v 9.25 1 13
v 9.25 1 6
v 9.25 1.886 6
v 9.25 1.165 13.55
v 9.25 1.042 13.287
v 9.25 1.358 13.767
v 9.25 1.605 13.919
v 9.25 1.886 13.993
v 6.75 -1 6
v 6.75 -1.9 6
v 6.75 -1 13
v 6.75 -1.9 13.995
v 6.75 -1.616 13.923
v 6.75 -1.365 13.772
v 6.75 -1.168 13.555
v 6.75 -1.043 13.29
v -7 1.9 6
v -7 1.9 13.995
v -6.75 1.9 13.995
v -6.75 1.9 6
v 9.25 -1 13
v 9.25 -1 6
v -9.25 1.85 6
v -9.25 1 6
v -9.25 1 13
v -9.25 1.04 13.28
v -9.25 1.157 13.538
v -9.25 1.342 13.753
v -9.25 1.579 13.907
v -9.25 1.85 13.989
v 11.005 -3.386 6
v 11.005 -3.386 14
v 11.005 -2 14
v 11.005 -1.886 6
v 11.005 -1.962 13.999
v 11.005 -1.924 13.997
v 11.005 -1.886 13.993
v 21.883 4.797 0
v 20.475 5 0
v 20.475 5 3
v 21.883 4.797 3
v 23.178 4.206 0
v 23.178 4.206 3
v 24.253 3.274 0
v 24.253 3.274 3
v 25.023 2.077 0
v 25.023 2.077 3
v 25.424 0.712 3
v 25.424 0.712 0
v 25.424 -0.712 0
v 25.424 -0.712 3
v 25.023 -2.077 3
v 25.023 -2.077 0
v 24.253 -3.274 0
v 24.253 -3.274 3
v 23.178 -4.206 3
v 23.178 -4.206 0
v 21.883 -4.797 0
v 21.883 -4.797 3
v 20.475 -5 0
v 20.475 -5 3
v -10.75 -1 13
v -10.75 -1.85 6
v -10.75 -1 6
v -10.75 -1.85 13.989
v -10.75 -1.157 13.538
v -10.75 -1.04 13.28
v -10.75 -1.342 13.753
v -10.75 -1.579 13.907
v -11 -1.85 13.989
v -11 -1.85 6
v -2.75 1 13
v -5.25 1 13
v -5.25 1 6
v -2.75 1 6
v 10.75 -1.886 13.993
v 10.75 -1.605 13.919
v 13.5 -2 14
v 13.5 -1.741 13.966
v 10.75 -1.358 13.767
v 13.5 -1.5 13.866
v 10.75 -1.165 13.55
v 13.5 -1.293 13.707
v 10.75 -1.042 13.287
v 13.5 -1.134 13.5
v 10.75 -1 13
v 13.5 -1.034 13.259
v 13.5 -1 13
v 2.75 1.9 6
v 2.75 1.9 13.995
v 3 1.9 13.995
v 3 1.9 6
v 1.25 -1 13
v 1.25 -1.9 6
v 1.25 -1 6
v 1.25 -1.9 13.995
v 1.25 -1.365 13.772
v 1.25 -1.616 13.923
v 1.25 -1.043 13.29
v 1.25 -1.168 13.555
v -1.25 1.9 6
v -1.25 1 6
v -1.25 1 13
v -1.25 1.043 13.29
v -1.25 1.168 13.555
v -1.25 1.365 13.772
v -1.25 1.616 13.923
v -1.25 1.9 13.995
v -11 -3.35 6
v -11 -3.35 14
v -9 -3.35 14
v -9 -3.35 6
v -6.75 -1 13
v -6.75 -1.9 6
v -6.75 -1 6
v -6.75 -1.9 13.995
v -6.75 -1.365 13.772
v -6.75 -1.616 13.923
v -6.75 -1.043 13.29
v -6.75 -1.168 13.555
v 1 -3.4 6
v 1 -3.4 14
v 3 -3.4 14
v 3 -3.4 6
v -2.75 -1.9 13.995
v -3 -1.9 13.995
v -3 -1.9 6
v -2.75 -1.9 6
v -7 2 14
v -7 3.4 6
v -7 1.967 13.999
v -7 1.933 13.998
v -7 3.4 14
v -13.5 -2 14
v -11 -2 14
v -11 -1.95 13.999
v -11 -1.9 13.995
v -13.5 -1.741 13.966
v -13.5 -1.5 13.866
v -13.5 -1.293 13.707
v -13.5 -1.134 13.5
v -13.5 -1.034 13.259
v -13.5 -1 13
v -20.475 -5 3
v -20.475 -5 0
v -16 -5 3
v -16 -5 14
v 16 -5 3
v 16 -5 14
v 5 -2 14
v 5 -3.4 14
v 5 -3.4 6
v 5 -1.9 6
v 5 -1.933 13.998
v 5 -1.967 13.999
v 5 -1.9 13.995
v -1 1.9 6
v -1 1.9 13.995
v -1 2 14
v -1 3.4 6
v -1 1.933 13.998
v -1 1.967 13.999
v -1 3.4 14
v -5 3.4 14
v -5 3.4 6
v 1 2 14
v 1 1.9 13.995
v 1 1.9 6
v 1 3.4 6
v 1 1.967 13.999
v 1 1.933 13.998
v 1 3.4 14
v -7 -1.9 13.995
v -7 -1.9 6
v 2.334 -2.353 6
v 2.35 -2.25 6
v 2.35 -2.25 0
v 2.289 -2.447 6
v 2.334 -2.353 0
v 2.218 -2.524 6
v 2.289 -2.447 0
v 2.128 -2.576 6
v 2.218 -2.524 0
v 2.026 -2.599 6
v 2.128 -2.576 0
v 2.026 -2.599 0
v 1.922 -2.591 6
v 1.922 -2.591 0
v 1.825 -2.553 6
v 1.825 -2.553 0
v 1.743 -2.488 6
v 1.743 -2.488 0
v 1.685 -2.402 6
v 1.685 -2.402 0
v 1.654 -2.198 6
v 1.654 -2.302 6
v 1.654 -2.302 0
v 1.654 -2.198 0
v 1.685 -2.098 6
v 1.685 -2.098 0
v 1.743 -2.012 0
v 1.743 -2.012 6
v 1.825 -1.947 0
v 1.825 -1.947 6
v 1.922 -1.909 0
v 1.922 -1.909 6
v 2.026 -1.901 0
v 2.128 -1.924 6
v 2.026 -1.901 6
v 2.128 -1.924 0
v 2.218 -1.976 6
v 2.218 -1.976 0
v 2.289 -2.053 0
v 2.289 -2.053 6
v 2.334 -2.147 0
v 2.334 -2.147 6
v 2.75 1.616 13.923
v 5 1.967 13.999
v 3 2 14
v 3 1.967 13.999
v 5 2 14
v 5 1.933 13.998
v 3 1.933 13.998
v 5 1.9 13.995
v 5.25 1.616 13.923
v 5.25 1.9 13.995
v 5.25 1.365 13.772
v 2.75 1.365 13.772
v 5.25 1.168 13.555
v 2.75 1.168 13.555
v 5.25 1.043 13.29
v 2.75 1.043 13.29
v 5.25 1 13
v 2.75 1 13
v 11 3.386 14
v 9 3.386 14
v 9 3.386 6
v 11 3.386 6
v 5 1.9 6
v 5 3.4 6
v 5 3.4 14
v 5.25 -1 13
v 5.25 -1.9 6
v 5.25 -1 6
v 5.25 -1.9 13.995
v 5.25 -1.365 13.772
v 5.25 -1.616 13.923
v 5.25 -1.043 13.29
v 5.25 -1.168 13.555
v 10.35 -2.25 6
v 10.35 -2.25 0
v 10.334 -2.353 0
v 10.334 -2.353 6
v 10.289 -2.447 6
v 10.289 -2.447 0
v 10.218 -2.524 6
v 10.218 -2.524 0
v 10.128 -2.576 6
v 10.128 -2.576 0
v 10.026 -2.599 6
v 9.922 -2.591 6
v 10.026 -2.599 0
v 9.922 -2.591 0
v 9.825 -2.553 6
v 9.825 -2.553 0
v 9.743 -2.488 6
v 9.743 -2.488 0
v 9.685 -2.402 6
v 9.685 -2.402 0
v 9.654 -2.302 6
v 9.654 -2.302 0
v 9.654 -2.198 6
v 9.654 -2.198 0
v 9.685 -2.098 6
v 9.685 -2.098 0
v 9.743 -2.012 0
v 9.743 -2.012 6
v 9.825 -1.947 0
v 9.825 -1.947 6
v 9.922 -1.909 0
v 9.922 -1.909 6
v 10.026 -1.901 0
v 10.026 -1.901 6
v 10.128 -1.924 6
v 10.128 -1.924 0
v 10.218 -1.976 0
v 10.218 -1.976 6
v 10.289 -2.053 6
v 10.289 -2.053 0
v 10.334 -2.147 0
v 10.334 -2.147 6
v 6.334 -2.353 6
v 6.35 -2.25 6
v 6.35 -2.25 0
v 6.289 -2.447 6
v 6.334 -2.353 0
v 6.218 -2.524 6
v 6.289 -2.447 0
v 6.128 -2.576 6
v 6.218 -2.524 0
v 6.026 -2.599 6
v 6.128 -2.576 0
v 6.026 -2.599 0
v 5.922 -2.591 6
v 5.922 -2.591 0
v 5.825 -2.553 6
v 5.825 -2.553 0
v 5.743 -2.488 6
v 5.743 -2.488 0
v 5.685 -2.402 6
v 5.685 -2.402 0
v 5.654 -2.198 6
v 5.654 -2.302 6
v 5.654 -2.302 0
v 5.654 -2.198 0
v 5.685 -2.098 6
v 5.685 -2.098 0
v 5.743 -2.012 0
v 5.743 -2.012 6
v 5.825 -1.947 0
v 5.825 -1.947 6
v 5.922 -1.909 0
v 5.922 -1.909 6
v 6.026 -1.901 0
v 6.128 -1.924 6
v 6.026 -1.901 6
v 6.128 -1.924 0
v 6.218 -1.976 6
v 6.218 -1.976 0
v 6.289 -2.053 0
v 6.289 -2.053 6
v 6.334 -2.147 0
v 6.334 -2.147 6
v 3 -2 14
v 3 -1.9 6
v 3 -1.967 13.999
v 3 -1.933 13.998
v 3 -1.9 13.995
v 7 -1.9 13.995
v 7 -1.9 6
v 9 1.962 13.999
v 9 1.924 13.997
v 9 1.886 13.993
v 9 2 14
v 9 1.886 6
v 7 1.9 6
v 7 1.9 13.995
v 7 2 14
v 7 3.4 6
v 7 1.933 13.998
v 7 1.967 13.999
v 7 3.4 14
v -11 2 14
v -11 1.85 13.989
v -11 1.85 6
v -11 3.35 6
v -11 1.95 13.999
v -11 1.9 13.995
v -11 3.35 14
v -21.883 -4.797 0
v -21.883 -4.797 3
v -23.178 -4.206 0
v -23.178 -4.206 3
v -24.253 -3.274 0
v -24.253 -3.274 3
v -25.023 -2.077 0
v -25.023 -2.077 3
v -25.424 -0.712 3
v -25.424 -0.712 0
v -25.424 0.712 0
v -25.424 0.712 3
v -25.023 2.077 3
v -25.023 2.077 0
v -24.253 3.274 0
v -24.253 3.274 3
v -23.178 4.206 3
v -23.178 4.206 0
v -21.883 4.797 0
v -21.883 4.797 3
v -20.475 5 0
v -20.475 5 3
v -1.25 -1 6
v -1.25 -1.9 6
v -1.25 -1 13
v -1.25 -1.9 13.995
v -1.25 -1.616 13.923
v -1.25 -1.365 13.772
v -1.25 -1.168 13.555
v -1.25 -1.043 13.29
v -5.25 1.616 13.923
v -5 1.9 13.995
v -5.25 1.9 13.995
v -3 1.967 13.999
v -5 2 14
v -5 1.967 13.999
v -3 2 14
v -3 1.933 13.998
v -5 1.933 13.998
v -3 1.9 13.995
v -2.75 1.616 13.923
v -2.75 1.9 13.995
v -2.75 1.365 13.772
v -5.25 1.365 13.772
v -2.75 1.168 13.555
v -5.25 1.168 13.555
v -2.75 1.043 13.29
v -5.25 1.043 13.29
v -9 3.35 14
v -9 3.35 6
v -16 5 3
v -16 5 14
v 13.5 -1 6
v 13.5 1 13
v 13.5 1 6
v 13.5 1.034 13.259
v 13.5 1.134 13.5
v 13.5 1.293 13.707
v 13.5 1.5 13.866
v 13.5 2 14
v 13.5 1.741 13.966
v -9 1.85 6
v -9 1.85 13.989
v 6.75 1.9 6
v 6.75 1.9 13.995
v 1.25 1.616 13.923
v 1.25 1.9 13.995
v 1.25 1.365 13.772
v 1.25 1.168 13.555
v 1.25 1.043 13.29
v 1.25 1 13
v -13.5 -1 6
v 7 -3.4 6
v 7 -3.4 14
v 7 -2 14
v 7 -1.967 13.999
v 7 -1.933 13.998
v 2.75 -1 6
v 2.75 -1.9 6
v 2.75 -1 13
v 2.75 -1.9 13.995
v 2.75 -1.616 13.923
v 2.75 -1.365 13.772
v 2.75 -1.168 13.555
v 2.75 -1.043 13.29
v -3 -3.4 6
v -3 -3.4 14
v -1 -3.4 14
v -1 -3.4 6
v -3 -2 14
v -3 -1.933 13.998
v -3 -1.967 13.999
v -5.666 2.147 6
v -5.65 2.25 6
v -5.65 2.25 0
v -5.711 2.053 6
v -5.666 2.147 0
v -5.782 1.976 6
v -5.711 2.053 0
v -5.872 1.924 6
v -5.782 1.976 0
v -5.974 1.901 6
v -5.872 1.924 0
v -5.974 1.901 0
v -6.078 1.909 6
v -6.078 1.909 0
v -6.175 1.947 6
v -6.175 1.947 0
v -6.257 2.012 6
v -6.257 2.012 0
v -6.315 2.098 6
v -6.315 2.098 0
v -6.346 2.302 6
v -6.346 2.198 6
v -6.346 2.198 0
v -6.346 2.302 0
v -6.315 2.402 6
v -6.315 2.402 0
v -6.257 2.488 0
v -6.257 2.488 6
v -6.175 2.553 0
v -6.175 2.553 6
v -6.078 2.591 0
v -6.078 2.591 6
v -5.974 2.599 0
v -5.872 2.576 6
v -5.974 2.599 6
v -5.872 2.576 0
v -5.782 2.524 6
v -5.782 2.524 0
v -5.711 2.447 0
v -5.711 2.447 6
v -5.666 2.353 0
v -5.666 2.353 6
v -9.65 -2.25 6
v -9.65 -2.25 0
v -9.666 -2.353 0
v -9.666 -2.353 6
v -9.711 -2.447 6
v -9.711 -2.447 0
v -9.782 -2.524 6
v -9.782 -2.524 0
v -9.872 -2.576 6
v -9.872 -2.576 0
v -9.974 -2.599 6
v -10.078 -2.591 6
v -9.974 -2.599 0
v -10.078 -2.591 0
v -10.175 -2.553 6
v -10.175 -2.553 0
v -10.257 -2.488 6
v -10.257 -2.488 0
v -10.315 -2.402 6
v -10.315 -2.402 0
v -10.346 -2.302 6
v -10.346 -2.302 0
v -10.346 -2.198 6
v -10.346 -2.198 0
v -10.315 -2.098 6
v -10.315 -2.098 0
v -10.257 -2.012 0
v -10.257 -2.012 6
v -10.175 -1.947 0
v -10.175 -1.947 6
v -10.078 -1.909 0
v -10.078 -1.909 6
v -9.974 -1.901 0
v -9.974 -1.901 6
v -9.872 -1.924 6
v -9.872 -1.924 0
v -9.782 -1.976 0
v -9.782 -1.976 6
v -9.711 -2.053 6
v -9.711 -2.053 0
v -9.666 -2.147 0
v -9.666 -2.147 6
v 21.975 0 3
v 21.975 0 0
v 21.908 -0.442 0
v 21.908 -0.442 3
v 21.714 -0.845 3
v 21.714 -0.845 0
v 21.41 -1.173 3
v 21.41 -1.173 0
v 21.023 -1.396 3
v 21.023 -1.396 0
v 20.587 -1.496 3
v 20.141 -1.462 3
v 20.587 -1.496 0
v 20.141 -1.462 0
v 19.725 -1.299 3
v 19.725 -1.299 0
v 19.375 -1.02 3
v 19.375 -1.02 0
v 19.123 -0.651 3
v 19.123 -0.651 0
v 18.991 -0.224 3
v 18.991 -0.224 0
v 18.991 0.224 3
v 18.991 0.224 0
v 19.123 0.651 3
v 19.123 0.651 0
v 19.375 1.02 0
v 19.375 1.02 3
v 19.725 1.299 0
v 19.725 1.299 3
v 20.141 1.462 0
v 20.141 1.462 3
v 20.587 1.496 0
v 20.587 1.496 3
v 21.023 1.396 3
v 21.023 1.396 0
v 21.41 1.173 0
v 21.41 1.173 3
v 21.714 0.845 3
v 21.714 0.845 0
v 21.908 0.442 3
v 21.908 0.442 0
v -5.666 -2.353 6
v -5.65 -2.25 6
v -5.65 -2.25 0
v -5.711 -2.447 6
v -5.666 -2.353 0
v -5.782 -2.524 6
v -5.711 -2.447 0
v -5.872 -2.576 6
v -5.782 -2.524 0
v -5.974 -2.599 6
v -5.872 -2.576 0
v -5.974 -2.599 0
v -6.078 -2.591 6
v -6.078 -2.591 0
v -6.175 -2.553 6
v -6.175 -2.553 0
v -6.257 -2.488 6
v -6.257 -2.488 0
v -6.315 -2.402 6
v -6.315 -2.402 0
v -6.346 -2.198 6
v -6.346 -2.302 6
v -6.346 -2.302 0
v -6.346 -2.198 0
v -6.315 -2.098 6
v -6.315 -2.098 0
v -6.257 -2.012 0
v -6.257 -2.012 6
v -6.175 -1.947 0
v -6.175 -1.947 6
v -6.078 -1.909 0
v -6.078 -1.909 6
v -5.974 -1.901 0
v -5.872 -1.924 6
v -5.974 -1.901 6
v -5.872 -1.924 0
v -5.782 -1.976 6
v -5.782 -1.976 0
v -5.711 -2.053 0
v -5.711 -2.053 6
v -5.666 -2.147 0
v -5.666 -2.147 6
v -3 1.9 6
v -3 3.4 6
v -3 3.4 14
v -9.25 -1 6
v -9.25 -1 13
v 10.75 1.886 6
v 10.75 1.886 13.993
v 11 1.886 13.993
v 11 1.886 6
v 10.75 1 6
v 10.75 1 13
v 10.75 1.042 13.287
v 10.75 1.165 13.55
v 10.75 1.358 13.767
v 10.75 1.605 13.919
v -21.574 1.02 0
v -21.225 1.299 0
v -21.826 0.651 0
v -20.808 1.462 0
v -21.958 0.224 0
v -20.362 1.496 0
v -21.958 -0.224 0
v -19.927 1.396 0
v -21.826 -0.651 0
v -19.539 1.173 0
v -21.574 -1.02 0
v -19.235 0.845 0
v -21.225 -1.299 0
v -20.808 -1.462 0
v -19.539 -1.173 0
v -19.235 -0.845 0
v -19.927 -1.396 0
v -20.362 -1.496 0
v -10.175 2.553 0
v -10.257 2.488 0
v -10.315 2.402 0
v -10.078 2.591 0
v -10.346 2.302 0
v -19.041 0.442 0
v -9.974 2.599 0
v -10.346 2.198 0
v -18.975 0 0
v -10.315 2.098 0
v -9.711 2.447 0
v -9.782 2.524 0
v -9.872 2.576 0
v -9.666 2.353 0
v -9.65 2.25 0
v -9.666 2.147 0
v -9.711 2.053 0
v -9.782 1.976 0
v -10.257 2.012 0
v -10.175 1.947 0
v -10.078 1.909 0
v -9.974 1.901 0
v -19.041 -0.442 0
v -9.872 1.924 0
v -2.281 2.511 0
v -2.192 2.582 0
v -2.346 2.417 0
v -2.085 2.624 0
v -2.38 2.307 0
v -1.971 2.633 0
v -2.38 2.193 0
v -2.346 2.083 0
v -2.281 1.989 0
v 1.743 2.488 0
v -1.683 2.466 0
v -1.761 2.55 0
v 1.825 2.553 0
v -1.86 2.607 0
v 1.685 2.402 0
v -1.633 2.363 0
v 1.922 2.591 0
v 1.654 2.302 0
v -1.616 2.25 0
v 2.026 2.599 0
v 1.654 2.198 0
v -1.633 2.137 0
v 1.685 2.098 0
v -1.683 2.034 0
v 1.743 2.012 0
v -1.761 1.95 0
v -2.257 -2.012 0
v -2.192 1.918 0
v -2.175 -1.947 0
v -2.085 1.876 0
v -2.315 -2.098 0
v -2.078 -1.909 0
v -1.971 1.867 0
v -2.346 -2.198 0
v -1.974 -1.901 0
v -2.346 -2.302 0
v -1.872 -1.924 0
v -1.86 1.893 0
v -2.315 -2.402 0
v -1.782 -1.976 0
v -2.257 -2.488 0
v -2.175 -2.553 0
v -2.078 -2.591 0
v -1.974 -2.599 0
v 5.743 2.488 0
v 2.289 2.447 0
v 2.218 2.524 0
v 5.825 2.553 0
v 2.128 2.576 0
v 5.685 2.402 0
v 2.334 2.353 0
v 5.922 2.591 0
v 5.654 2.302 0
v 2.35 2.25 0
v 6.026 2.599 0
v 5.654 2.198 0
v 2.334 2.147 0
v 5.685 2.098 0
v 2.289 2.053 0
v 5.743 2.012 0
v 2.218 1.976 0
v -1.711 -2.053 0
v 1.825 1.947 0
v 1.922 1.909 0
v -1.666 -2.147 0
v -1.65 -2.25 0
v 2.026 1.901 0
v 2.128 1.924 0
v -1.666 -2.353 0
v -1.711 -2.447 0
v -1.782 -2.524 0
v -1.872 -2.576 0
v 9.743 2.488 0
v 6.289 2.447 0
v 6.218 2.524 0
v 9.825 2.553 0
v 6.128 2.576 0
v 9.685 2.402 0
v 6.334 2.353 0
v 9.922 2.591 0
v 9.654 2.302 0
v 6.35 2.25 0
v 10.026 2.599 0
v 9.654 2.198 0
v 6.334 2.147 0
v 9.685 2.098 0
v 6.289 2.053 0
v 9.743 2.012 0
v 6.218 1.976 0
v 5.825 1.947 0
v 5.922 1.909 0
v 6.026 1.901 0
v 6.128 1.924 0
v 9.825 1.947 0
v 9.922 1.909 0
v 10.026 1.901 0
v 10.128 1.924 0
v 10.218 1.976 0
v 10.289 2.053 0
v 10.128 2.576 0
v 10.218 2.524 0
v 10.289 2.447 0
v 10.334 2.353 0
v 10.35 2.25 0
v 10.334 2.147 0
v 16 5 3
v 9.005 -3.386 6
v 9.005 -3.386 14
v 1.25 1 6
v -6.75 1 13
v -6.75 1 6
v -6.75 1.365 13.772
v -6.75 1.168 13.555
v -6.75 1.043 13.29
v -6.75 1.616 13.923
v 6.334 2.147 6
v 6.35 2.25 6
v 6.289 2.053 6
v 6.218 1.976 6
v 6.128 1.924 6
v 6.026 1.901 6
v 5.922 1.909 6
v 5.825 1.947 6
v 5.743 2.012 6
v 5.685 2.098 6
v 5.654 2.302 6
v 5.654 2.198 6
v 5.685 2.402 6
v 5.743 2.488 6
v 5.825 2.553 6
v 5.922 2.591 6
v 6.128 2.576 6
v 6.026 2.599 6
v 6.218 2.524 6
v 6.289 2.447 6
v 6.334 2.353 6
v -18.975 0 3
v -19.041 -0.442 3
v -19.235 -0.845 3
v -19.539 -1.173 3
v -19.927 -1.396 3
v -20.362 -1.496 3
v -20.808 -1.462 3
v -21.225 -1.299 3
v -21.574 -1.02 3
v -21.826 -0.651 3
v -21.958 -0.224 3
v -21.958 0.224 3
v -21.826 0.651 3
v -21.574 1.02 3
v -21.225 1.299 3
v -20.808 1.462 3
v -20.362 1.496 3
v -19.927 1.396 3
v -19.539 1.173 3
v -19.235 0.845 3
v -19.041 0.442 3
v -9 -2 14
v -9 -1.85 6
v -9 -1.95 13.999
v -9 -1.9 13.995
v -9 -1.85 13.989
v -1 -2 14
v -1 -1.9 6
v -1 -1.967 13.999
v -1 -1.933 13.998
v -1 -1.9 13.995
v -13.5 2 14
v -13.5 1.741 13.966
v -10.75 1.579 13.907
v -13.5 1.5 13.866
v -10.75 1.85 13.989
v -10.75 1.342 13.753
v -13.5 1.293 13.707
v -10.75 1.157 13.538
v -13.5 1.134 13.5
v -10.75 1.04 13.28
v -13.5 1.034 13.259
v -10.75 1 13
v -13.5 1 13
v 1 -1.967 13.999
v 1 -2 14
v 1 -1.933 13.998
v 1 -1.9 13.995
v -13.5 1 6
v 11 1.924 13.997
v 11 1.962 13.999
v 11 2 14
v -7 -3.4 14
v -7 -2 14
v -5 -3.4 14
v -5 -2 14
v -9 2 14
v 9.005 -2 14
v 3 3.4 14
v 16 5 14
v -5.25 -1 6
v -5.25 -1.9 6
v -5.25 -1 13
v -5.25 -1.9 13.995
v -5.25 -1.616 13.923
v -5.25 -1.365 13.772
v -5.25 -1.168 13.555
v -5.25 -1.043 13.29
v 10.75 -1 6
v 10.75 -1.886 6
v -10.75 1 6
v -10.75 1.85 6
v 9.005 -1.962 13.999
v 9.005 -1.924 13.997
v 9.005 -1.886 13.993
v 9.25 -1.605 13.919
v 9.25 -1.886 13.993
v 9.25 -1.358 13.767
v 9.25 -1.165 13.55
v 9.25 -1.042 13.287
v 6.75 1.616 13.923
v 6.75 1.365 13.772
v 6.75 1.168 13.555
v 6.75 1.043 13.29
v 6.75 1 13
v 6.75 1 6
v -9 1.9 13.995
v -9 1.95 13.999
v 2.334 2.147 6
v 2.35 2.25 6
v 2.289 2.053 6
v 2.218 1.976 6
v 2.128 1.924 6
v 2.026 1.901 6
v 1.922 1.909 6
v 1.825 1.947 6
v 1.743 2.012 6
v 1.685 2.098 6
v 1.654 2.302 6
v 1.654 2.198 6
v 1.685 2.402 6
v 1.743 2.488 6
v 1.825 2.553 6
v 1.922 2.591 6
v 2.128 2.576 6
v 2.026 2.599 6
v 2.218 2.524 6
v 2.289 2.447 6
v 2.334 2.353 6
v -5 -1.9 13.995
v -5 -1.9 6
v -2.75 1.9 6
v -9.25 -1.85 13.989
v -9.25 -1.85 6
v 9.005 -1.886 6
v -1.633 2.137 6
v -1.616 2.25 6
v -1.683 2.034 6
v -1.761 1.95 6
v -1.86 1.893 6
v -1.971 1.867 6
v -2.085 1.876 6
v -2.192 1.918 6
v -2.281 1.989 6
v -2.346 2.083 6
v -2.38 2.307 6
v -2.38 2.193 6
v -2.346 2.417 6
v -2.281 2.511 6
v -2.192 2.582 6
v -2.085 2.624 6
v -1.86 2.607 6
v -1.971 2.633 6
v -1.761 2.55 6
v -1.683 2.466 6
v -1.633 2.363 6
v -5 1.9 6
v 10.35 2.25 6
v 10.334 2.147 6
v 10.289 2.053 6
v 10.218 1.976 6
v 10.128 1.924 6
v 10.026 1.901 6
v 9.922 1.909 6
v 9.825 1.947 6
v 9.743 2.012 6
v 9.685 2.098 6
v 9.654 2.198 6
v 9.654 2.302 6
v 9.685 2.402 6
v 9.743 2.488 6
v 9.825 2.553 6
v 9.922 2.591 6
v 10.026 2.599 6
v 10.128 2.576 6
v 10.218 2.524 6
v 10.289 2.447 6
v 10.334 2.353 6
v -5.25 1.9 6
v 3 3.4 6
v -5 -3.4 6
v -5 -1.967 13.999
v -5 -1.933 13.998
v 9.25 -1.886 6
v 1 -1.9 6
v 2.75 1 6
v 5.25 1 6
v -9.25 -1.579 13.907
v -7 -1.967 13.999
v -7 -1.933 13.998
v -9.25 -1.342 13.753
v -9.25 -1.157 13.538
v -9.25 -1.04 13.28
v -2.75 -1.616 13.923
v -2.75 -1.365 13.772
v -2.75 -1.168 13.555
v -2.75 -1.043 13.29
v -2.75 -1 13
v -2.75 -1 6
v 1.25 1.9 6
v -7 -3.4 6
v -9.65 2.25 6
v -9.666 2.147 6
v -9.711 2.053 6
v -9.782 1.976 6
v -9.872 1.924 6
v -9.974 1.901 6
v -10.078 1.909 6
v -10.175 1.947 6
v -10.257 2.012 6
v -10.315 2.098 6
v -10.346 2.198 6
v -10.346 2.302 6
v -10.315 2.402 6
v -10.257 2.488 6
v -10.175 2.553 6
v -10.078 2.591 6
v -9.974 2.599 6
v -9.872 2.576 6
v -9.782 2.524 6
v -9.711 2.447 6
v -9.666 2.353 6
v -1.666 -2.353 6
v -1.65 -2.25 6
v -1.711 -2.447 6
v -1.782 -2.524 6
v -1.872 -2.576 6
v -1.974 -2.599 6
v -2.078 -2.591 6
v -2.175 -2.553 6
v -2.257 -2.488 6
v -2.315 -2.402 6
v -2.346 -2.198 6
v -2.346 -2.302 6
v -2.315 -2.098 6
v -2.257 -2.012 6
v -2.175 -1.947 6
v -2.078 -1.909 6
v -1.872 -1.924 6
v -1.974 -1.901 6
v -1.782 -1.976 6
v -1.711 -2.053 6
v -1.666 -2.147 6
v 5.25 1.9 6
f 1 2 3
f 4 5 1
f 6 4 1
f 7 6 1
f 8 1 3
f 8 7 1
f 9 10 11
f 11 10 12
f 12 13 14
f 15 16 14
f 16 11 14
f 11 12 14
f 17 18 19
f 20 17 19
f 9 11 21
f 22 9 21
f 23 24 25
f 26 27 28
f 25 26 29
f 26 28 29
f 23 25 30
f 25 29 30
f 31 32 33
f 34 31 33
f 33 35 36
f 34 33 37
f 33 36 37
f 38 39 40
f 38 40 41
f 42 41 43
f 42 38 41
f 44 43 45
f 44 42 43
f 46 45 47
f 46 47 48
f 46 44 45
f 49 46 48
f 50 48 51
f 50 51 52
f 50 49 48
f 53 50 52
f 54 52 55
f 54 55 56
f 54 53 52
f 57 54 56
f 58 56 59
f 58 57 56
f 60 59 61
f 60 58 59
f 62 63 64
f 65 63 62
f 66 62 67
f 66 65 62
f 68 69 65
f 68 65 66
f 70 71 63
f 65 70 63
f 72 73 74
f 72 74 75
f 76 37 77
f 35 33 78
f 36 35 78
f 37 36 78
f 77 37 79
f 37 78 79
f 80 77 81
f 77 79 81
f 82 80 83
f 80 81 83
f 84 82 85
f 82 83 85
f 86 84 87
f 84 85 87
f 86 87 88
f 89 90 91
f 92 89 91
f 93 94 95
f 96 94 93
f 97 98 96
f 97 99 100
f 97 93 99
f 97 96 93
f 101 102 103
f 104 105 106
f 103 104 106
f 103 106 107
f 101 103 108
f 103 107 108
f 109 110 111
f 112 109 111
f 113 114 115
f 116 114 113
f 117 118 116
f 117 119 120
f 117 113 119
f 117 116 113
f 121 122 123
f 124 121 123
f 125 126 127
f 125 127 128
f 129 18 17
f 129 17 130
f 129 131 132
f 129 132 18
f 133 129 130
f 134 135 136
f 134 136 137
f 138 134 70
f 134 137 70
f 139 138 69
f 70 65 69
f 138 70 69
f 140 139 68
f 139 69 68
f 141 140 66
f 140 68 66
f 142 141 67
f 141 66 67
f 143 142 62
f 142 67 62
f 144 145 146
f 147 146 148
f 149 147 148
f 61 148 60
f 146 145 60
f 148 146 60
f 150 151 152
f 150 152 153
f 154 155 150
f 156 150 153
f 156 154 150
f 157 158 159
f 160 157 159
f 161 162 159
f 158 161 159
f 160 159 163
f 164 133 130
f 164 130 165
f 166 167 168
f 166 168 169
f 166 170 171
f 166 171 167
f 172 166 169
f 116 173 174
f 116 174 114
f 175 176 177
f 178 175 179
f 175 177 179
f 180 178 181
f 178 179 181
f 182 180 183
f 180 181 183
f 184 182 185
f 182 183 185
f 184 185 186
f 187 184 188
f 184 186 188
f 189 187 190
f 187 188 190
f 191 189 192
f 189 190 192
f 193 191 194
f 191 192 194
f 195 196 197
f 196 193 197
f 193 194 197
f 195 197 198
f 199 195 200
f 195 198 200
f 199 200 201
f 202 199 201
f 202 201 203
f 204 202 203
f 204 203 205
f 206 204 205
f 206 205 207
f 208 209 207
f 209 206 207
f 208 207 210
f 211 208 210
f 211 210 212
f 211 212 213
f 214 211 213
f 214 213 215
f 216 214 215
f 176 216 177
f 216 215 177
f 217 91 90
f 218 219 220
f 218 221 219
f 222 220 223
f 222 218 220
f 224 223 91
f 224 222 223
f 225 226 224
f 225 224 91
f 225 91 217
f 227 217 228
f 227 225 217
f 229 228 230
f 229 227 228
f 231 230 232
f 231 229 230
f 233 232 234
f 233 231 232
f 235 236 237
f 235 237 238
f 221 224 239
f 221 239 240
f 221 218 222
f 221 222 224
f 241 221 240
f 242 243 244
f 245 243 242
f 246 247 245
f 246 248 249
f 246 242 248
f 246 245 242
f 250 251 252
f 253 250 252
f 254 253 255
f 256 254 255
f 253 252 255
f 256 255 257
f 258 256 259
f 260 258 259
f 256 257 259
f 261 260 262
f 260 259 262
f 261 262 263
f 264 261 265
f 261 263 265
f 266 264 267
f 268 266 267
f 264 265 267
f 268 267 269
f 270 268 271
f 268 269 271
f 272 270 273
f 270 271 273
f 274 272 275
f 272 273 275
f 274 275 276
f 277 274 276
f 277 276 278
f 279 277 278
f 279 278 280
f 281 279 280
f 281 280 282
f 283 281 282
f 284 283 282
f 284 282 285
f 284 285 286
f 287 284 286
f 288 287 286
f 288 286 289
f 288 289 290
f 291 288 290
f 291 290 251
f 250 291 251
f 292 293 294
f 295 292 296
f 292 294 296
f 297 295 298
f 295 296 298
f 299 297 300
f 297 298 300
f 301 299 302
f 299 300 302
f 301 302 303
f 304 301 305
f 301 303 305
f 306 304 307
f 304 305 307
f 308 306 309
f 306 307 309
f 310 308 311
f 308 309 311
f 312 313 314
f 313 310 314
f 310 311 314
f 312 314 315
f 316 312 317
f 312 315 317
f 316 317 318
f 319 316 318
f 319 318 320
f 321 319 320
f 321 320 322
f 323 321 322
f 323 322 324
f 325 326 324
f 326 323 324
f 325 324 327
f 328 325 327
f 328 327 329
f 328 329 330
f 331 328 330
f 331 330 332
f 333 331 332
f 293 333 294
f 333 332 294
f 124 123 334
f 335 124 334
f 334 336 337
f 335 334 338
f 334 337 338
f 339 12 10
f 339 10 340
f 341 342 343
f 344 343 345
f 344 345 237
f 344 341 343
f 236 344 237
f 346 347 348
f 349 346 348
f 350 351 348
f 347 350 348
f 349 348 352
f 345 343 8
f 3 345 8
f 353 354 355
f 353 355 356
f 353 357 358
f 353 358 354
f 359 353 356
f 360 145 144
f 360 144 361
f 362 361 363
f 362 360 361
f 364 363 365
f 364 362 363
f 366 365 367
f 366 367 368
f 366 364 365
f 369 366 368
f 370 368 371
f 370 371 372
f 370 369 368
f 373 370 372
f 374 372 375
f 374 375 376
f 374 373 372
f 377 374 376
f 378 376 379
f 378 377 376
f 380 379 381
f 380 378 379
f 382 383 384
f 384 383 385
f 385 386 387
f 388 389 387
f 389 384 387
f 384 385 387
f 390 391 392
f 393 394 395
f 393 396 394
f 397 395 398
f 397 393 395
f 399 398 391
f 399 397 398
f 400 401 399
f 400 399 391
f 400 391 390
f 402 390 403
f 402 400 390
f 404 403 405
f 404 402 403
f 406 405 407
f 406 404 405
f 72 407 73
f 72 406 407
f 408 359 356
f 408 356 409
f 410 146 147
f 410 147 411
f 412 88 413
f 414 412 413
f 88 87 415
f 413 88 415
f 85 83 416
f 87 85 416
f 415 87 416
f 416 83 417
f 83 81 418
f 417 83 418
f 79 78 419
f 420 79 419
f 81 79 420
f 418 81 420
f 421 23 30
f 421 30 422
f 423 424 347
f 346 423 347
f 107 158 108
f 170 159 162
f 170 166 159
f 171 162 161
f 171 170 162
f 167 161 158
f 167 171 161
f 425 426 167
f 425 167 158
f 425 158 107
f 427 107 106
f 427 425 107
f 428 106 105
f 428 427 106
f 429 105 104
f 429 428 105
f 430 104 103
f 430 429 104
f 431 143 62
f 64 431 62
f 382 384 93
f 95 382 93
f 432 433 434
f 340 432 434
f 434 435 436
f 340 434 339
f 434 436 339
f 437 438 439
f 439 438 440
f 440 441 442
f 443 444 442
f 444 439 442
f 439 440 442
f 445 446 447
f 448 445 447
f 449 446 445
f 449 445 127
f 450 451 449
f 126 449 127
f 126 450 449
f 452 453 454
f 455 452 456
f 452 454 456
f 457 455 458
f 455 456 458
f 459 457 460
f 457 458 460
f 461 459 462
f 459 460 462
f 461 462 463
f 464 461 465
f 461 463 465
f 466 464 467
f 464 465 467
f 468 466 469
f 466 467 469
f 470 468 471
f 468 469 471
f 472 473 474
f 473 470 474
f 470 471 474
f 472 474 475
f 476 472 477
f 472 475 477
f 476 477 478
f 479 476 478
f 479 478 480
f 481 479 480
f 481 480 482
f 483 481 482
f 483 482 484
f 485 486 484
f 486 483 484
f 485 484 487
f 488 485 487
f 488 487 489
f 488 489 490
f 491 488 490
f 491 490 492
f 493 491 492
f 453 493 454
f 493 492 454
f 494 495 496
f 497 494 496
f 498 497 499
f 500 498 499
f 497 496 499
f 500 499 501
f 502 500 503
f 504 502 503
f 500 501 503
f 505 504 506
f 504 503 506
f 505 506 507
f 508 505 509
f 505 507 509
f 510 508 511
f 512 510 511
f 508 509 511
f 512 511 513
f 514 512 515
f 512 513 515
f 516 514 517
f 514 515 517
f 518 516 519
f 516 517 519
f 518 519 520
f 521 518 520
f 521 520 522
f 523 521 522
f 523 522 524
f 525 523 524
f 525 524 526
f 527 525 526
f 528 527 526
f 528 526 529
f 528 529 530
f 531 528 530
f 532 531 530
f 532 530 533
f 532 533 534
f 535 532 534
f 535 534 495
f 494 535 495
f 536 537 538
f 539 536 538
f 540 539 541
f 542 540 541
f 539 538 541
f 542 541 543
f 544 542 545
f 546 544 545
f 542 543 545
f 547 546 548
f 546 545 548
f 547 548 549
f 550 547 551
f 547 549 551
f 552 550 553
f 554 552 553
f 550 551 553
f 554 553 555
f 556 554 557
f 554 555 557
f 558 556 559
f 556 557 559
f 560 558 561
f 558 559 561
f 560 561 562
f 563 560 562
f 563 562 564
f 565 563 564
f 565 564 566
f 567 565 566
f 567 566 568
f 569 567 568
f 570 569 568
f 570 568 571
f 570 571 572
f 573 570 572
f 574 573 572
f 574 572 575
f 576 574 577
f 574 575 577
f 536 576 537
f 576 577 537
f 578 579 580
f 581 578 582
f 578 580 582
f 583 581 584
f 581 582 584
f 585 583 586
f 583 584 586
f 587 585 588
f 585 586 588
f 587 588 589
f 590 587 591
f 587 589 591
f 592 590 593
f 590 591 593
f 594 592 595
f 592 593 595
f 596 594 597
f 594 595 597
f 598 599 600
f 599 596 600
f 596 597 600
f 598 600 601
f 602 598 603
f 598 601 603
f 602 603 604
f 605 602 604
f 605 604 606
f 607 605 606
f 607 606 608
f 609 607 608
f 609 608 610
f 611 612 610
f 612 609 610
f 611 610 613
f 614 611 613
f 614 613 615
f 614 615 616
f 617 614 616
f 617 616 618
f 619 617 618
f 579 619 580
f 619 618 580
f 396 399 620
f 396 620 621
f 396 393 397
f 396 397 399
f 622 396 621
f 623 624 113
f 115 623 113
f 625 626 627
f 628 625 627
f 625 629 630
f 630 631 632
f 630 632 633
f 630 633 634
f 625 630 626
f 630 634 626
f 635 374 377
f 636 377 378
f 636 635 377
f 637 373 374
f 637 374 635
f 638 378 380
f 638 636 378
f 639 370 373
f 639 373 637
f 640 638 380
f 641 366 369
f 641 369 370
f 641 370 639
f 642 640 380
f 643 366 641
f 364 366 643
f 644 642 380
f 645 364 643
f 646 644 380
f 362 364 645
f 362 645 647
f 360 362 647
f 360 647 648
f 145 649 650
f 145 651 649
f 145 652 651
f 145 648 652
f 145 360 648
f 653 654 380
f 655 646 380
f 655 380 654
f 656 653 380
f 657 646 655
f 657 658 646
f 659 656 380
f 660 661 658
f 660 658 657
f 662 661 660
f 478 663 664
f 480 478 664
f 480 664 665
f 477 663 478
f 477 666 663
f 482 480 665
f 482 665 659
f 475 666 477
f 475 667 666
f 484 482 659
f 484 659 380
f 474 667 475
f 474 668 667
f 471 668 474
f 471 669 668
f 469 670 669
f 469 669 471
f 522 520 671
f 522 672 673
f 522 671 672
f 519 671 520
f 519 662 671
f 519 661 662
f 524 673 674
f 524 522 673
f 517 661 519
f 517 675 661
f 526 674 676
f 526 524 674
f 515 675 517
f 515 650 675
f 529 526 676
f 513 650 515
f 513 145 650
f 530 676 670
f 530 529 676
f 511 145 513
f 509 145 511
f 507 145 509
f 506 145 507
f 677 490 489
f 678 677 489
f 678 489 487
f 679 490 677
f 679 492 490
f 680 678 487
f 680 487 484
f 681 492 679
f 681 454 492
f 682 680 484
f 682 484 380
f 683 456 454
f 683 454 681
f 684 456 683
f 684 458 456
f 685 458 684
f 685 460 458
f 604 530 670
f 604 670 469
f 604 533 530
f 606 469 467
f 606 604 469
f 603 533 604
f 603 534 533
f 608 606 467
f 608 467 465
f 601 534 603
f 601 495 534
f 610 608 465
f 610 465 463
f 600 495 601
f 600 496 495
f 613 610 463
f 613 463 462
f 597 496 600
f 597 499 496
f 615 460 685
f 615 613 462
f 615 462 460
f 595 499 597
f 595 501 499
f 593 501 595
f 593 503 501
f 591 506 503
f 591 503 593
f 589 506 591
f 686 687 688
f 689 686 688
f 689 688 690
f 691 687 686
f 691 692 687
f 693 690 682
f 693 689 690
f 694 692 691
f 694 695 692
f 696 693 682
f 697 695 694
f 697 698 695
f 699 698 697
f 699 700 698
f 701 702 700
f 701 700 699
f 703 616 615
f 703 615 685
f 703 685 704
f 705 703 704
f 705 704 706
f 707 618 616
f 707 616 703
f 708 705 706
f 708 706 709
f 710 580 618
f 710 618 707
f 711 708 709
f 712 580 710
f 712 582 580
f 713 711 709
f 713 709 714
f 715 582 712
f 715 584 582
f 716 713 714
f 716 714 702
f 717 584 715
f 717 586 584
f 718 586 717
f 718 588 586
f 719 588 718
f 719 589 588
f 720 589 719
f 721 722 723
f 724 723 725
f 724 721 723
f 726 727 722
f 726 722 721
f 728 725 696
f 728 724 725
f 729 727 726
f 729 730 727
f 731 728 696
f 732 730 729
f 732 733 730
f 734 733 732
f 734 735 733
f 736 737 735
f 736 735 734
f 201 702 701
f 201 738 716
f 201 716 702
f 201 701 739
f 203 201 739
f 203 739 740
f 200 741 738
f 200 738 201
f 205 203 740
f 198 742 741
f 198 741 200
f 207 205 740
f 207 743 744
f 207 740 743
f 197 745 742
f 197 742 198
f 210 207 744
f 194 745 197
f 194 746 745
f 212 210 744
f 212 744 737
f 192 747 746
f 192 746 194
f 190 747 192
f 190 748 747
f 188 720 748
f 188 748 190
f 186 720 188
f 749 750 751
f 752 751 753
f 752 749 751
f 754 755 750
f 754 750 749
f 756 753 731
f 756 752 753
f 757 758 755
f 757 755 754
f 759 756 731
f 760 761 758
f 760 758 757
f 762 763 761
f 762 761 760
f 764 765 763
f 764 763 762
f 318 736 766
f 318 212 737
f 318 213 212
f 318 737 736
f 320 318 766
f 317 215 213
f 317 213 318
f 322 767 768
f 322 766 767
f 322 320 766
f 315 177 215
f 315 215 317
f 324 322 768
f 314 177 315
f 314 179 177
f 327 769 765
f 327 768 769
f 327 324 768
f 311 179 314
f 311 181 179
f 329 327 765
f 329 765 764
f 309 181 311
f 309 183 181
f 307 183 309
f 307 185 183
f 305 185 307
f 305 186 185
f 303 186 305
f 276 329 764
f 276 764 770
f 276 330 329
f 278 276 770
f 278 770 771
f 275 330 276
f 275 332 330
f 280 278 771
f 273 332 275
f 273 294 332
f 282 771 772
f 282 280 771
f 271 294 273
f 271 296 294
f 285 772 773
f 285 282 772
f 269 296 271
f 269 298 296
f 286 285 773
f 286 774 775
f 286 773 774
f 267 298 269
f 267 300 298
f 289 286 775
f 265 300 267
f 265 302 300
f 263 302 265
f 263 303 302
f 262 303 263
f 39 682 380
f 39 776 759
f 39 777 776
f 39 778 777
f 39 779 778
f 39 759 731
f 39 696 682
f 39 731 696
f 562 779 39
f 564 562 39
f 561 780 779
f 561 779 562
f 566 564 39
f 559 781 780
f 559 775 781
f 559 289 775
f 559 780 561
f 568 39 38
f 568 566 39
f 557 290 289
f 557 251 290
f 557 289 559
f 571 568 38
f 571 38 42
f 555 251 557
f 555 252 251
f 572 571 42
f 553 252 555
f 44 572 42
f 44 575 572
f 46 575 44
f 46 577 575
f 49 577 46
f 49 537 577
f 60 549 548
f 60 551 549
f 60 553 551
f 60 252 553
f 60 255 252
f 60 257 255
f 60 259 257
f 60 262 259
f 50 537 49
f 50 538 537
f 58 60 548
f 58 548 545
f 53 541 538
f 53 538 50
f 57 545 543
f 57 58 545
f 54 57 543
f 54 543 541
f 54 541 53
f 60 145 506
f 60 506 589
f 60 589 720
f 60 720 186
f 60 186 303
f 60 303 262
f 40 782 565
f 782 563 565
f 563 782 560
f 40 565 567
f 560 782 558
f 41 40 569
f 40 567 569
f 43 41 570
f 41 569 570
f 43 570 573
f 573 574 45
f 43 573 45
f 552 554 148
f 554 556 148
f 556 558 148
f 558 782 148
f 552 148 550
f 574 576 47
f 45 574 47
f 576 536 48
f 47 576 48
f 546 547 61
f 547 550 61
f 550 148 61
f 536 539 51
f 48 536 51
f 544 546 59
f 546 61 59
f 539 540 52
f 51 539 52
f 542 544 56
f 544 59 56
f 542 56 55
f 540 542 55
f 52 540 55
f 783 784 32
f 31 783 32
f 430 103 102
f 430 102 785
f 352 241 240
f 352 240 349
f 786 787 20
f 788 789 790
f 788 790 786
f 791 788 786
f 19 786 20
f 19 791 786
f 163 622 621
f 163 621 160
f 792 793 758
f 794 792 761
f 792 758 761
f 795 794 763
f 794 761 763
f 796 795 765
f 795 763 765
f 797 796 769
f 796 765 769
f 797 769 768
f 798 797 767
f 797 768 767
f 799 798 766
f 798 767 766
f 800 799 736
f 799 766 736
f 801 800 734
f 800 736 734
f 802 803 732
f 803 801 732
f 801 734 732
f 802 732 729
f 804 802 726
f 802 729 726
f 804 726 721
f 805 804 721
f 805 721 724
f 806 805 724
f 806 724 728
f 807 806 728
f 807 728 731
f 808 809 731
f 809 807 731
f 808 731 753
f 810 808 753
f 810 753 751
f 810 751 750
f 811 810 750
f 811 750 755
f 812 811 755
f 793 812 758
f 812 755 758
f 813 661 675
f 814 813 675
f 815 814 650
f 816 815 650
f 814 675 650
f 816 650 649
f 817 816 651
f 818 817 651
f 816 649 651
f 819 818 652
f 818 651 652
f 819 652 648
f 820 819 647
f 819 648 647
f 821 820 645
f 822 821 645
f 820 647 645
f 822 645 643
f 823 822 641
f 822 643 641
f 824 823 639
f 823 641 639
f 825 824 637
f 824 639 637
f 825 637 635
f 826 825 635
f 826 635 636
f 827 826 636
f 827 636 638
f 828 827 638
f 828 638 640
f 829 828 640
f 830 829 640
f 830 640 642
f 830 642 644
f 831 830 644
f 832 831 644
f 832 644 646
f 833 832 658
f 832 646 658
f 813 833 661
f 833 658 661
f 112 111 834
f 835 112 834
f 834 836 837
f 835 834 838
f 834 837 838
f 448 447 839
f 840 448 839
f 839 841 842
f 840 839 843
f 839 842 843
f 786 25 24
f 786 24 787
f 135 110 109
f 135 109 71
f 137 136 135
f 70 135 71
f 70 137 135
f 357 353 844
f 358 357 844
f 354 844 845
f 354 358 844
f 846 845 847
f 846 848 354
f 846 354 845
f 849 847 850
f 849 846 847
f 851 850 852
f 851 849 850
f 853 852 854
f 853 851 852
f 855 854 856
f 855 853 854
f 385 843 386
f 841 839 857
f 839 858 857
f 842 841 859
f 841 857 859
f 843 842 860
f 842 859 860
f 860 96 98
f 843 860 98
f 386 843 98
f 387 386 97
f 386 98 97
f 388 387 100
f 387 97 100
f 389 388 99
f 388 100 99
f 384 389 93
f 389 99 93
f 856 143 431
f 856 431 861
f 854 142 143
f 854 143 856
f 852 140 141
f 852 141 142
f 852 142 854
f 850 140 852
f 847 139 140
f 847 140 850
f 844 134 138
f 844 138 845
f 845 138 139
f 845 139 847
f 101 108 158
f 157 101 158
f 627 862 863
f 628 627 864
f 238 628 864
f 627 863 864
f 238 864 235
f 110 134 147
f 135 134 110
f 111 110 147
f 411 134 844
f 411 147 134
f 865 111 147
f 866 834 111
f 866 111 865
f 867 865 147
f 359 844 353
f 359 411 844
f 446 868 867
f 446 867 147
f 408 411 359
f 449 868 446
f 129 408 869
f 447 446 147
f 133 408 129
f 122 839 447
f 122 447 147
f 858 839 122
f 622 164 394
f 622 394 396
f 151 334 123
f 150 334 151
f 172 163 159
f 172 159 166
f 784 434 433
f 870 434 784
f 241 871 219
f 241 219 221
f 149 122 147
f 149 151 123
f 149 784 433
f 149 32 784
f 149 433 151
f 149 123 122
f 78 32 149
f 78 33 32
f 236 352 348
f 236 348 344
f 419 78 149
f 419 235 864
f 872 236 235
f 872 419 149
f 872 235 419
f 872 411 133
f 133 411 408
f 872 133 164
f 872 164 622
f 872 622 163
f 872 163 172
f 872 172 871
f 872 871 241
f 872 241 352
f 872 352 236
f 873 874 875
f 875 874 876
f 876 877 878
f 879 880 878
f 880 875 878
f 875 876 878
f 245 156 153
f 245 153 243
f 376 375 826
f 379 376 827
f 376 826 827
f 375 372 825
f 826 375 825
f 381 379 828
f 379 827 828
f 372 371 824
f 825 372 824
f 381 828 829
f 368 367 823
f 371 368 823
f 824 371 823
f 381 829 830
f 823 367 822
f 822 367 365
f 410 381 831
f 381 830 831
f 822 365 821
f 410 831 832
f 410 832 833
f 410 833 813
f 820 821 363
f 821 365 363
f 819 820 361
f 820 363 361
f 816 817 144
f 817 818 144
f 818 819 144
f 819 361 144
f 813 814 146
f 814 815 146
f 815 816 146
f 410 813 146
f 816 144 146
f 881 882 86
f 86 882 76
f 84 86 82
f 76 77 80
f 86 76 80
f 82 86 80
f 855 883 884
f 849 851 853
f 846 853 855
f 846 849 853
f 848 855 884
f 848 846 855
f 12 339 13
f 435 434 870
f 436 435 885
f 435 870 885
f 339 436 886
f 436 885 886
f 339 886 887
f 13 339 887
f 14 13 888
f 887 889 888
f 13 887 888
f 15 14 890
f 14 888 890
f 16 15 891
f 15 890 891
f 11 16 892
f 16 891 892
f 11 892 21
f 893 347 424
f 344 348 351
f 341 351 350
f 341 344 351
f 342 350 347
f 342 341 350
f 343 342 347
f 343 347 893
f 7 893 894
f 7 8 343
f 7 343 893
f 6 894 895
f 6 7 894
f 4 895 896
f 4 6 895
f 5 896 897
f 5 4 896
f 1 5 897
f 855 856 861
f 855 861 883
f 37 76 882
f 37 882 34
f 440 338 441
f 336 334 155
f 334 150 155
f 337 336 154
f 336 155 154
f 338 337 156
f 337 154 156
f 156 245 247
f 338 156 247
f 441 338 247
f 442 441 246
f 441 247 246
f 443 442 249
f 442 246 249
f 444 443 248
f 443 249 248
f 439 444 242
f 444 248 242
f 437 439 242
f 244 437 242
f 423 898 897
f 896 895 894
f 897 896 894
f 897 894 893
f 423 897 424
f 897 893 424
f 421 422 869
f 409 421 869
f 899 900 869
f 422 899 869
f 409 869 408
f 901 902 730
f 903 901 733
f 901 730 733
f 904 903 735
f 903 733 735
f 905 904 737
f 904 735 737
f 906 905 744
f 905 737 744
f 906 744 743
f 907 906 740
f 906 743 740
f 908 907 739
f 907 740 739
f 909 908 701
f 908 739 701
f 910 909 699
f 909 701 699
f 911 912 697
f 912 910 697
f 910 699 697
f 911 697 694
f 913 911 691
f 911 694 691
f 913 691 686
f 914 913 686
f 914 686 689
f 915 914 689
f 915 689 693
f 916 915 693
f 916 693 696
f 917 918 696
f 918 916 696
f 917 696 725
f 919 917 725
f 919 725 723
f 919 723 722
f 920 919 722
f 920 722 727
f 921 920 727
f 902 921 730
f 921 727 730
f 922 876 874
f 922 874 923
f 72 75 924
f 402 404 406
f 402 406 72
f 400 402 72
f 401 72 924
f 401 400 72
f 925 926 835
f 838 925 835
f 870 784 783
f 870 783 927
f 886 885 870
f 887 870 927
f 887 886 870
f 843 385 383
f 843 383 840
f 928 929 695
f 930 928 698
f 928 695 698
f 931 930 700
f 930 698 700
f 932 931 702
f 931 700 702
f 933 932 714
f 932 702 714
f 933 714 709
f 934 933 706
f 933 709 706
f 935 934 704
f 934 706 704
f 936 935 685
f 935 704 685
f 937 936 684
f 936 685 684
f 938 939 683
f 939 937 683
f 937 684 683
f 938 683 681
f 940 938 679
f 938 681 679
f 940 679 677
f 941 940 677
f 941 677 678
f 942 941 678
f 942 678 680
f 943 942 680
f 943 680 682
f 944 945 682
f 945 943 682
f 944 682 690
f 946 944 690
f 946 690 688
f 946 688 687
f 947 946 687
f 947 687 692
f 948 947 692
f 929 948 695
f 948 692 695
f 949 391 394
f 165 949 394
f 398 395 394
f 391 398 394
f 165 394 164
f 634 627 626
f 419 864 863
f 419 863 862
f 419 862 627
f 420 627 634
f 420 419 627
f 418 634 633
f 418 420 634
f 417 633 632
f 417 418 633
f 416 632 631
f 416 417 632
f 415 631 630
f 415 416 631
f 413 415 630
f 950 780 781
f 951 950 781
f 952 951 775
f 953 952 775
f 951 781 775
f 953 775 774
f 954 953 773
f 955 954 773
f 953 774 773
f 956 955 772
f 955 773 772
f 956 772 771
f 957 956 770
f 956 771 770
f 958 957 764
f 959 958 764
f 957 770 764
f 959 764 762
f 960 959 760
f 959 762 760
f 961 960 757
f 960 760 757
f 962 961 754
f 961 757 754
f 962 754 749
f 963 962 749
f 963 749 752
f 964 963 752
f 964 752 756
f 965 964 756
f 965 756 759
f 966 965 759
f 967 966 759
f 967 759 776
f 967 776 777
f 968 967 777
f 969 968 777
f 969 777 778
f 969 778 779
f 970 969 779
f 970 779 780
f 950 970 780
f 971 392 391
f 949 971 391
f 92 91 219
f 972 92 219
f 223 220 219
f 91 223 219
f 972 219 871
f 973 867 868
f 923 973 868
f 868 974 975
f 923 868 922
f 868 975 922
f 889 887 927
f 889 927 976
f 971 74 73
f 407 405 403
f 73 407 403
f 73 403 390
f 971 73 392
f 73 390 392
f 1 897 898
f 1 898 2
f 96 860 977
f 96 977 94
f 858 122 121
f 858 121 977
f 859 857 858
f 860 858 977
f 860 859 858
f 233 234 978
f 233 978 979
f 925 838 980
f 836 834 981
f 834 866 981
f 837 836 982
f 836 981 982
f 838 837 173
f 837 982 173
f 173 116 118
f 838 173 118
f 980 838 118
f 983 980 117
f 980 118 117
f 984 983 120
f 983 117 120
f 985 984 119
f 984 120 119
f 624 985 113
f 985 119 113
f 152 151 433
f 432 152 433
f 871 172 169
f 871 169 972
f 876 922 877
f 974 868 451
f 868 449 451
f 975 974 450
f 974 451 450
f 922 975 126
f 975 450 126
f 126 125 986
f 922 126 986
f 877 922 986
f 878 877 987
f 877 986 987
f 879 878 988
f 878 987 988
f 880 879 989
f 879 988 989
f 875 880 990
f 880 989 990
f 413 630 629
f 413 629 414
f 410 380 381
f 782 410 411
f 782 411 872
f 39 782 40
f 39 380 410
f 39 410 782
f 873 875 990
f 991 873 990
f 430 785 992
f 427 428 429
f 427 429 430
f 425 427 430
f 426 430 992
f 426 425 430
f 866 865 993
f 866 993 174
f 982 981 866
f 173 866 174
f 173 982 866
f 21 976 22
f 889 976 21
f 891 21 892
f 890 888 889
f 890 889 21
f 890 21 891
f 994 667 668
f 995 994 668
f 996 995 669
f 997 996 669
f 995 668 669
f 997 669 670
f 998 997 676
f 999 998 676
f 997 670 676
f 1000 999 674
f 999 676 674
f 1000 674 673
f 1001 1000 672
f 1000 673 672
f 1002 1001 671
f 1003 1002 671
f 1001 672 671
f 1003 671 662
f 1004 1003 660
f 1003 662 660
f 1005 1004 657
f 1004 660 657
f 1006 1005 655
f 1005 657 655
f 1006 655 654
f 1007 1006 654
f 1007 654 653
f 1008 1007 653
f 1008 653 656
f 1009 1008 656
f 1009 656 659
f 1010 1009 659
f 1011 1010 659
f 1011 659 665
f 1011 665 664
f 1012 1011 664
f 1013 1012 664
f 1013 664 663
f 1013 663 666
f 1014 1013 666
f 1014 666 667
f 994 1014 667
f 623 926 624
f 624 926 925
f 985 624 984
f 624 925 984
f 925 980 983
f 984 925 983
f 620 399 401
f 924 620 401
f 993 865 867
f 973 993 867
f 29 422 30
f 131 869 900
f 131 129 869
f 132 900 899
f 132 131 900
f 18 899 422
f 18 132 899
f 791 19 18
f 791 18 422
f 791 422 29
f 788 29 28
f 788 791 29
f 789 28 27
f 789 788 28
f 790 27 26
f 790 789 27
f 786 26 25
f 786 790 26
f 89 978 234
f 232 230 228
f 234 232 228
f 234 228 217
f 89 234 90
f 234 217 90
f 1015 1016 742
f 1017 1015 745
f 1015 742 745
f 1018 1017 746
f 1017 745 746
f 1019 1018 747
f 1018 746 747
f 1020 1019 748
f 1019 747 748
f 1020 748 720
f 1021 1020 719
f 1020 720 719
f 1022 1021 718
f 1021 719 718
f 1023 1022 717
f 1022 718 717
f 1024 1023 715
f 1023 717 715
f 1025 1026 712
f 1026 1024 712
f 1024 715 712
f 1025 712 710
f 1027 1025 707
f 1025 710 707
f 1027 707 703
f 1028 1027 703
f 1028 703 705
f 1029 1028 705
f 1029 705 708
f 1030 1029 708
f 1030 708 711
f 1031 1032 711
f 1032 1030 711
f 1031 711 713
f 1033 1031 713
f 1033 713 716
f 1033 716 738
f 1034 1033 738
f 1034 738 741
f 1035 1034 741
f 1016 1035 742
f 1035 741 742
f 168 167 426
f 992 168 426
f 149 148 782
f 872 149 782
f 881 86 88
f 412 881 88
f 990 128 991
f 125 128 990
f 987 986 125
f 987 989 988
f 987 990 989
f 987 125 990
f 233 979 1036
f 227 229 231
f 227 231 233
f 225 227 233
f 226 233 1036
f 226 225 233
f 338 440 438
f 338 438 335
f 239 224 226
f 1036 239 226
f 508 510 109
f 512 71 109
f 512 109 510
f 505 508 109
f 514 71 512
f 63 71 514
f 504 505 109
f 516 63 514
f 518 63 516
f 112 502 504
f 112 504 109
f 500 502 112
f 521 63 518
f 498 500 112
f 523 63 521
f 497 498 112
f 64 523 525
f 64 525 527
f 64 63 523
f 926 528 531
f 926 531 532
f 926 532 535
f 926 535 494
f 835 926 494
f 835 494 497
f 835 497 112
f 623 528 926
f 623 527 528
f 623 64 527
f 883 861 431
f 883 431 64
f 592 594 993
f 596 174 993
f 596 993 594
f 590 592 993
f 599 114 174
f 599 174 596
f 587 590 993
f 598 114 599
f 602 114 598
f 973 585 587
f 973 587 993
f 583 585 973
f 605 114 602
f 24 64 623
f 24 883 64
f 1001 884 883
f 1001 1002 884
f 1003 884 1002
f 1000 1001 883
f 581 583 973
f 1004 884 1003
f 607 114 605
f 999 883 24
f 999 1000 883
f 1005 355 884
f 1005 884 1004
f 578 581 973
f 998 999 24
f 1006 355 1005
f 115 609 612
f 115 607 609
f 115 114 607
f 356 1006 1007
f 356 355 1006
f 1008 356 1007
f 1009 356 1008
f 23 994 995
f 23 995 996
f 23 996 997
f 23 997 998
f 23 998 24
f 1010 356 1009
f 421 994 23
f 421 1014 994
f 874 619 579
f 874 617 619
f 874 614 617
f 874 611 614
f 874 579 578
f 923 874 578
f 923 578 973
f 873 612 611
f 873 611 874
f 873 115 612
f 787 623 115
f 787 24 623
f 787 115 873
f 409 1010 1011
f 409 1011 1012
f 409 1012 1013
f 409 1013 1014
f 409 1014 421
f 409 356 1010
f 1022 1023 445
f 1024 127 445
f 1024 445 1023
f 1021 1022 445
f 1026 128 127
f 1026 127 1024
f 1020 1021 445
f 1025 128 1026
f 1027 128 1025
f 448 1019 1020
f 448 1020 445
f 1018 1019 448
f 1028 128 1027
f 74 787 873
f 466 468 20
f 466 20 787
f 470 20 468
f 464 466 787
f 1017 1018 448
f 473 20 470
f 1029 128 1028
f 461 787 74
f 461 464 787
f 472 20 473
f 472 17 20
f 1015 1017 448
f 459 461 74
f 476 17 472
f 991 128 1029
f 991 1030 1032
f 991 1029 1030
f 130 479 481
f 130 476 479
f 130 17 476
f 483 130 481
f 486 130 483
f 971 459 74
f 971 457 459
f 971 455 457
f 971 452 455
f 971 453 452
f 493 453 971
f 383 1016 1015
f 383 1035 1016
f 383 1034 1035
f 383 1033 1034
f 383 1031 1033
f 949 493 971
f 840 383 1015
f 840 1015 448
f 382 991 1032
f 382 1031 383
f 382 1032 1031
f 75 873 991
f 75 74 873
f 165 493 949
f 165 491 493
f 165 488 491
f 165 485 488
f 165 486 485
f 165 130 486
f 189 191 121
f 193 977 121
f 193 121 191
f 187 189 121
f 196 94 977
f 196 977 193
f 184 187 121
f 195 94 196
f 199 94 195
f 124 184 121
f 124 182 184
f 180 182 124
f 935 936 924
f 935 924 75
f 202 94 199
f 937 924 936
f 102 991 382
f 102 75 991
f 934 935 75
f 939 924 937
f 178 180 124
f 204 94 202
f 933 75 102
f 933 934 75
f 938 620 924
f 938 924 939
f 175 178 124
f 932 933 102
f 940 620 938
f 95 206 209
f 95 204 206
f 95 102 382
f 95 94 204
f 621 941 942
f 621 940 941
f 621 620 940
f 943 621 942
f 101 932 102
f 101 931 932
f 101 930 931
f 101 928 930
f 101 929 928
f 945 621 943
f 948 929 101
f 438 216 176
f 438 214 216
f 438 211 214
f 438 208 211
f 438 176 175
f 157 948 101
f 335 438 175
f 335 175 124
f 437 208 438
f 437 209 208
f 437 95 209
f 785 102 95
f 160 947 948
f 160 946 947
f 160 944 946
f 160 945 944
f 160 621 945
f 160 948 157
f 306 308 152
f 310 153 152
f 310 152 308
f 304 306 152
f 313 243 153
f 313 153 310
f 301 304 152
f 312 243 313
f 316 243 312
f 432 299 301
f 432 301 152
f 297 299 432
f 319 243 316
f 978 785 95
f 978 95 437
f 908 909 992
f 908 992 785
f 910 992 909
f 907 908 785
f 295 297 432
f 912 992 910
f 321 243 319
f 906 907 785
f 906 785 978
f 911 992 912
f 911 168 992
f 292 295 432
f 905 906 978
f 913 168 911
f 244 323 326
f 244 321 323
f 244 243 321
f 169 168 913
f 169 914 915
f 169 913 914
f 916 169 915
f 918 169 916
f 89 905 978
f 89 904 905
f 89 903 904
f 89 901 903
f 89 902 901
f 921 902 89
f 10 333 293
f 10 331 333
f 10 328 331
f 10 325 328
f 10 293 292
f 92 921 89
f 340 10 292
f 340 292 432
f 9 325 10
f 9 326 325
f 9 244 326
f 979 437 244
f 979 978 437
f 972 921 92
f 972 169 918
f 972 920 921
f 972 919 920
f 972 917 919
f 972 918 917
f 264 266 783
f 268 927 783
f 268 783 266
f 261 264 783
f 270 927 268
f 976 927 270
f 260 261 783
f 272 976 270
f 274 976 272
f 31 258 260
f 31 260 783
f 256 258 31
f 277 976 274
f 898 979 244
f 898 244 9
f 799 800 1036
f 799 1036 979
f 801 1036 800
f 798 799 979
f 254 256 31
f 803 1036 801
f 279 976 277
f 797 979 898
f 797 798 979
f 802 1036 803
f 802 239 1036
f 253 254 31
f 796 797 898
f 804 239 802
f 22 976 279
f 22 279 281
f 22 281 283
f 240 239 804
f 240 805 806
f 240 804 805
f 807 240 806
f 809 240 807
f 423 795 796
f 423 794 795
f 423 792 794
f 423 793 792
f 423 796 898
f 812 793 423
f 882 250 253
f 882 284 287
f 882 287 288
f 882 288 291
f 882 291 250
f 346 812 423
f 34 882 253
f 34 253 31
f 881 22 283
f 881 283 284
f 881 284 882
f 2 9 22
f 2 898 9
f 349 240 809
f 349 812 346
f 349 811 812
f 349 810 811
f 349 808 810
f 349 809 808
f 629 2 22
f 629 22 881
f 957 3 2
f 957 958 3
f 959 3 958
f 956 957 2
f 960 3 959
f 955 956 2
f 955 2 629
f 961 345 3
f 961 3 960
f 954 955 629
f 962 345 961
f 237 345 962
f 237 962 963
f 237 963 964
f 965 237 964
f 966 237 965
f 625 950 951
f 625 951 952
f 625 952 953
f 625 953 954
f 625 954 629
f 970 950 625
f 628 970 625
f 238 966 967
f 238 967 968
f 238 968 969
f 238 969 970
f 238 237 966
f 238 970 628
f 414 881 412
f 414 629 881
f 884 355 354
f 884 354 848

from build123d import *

# Parameters (mm, degrees)
SKETCH_W        = 32
SKETCH_H        = 10
PAD_DEPTH       = 14
SKETCH001_R     = 1.5
PAD001_DEPTH    = 3
SKETCH002_W     = 27
SKETCH002_H     = 2
POCKET_DEPTH    = 8
SKETCH003_R     = 0.35
SKETCH003_R_2   = 0.383924
POCKET001_DEPTH = 18
SKETCH004_W     = 1.5
SKETCH004_H     = 6.7
SKETCH004_H_2   = 6.8
SKETCH004_H_3   = 6.771652
POCKET002_DEPTH = 8
SKETCH005_W     = 2
SKETCH005_H     = 1.5
POCKET003_DEPTH = 8
FILLET_R        = 1


with BuildPart() as part:
    # Sketch → Pad (new body)
    with BuildSketch(Plane.XY):
        Rectangle(SKETCH_W, SKETCH_H)
    extrude(amount=PAD_DEPTH)

    # Sketch001 → Pad001 (new body)
    with BuildSketch(Plane(origin=(0, 0, 0), x_dir=(1, 0, 0), z_dir=(0, 0, -1))):
        with BuildLine():
            ThreePointArc((-20.474548, 5), (-25.474548, 0), (-20.474548, -5))
            Line((-20.474548, -5), (20.474548, -5))
            ThreePointArc((20.474548, -5), (25.474548, 0), (20.474548, 5))
            Line((-20.474548, 5), (20.474548, 5))
        make_face()
        with Locations((-20.474548, 0)):
            Circle(SKETCH001_R, mode=Mode.SUBTRACT)
        with Locations((20.474548, 0)):
            Circle(SKETCH001_R, mode=Mode.SUBTRACT)
    extrude(amount=-PAD001_DEPTH)

    # Sketch002 → Pocket (cut)
    with BuildSketch(Plane.XY.offset(14)):
        Rectangle(SKETCH002_W, SKETCH002_H)
    extrude(amount=-POCKET_DEPTH, mode=Mode.SUBTRACT)

    # Sketch003 → Pocket001 (cut)
    with BuildSketch(Plane(origin=(0, 0, 0), x_dir=(1, 0, 0), z_dir=(0, 0, -1))):
        with Locations((-10, 2.25)):
            Circle(SKETCH003_R)
        with Locations((-6, 2.25)):
            Circle(SKETCH003_R)
        with Locations((-2, 2.25)):
            Circle(SKETCH003_R)
        with Locations((2, 2.25)):
            Circle(SKETCH003_R)
        with Locations((6, 2.25)):
            Circle(SKETCH003_R)
        with Locations((10, 2.25)):
            Circle(SKETCH003_R)
        with Locations((-10, -2.25)):
            Circle(SKETCH003_R)
        with Locations((-6, -2.25)):
            Circle(SKETCH003_R)
        with Locations((-2, -2.25)):
            Circle(SKETCH003_R_2)
        with Locations((2, -2.25)):
            Circle(SKETCH003_R)
        with Locations((6, -2.25)):
            Circle(SKETCH003_R)
        with Locations((10, -2.25)):
            Circle(SKETCH003_R)
    extrude(amount=-POCKET001_DEPTH, mode=Mode.SUBTRACT)

    # Sketch004 → Pocket002 (cut)
    with BuildSketch(Plane.XY.offset(14)):
        with Locations((-10, 0)):
            Rectangle(SKETCH004_W, SKETCH004_H)
        with Locations((-6, 0)):
            Rectangle(SKETCH004_W, SKETCH004_H_2)
        with Locations((-2, 0)):
            Rectangle(SKETCH004_W, SKETCH004_H_2)
        with Locations((2, 0)):
            Rectangle(SKETCH004_W, SKETCH004_H_2)
        with Locations((6, 0)):
            Rectangle(SKETCH004_W, SKETCH004_H_2)
        with Locations((10, 0)):
            Rectangle(SKETCH004_W, SKETCH004_H_3)
    extrude(amount=-POCKET002_DEPTH, mode=Mode.SUBTRACT)

    # Sketch005 → Pocket003 (cut)
    with BuildSketch(Plane.XY.offset(14)):
        with Locations((-10, 2.6)):
            Rectangle(SKETCH005_W, SKETCH005_H)
        with Locations((-6, 2.65)):
            Rectangle(SKETCH005_W, SKETCH005_H)
        with Locations((-2, 2.65)):
            Rectangle(SKETCH005_W, SKETCH005_H)
        with Locations((2, 2.65)):
            Rectangle(SKETCH005_W, SKETCH005_H)
        with Locations((6, 2.65)):
            Rectangle(SKETCH005_W, SKETCH005_H)
        with Locations((10, 2.635826)):
            Rectangle(SKETCH005_W, SKETCH005_H)
        with Locations((-10, -2.6)):
            Rectangle(SKETCH005_W, SKETCH005_H)
        with Locations((-6, -2.65)):
            Rectangle(SKETCH005_W, SKETCH005_H)
        with Locations((-2, -2.65)):
            Rectangle(SKETCH005_W, SKETCH005_H)
        with Locations((2, -2.65)):
            Rectangle(SKETCH005_W, SKETCH005_H)
        with Locations((6, -2.65)):
            Rectangle(SKETCH005_W, SKETCH005_H)
        with Locations((10.005354, -2.635826)):
            Rectangle(SKETCH005_W, SKETCH005_H)
    extrude(amount=-POCKET003_DEPTH, mode=Mode.SUBTRACT)

    # Fillet
    fillet_edges = [part.edges().sort_by_distance(p)[0] for p in [
        (-12.125, 1, 14),
        (-8, 1, 14),
        (-4, 1, 14),
        (0, 1, 14),
        (4, 1, 14),
        (8, 1, 14),
        (12.125, 1, 14),
        (12.125, -1, 14),
        (8, -1, 14),
        (4, -1, 14),
        (0, -1, 14),
        (-4, -1, 14),
        (-8, -1, 14),
        (-12.125, -1, 14),
    ]]
    fillet(fillet_edges, radius=FILLET_R)


solid = part.part
